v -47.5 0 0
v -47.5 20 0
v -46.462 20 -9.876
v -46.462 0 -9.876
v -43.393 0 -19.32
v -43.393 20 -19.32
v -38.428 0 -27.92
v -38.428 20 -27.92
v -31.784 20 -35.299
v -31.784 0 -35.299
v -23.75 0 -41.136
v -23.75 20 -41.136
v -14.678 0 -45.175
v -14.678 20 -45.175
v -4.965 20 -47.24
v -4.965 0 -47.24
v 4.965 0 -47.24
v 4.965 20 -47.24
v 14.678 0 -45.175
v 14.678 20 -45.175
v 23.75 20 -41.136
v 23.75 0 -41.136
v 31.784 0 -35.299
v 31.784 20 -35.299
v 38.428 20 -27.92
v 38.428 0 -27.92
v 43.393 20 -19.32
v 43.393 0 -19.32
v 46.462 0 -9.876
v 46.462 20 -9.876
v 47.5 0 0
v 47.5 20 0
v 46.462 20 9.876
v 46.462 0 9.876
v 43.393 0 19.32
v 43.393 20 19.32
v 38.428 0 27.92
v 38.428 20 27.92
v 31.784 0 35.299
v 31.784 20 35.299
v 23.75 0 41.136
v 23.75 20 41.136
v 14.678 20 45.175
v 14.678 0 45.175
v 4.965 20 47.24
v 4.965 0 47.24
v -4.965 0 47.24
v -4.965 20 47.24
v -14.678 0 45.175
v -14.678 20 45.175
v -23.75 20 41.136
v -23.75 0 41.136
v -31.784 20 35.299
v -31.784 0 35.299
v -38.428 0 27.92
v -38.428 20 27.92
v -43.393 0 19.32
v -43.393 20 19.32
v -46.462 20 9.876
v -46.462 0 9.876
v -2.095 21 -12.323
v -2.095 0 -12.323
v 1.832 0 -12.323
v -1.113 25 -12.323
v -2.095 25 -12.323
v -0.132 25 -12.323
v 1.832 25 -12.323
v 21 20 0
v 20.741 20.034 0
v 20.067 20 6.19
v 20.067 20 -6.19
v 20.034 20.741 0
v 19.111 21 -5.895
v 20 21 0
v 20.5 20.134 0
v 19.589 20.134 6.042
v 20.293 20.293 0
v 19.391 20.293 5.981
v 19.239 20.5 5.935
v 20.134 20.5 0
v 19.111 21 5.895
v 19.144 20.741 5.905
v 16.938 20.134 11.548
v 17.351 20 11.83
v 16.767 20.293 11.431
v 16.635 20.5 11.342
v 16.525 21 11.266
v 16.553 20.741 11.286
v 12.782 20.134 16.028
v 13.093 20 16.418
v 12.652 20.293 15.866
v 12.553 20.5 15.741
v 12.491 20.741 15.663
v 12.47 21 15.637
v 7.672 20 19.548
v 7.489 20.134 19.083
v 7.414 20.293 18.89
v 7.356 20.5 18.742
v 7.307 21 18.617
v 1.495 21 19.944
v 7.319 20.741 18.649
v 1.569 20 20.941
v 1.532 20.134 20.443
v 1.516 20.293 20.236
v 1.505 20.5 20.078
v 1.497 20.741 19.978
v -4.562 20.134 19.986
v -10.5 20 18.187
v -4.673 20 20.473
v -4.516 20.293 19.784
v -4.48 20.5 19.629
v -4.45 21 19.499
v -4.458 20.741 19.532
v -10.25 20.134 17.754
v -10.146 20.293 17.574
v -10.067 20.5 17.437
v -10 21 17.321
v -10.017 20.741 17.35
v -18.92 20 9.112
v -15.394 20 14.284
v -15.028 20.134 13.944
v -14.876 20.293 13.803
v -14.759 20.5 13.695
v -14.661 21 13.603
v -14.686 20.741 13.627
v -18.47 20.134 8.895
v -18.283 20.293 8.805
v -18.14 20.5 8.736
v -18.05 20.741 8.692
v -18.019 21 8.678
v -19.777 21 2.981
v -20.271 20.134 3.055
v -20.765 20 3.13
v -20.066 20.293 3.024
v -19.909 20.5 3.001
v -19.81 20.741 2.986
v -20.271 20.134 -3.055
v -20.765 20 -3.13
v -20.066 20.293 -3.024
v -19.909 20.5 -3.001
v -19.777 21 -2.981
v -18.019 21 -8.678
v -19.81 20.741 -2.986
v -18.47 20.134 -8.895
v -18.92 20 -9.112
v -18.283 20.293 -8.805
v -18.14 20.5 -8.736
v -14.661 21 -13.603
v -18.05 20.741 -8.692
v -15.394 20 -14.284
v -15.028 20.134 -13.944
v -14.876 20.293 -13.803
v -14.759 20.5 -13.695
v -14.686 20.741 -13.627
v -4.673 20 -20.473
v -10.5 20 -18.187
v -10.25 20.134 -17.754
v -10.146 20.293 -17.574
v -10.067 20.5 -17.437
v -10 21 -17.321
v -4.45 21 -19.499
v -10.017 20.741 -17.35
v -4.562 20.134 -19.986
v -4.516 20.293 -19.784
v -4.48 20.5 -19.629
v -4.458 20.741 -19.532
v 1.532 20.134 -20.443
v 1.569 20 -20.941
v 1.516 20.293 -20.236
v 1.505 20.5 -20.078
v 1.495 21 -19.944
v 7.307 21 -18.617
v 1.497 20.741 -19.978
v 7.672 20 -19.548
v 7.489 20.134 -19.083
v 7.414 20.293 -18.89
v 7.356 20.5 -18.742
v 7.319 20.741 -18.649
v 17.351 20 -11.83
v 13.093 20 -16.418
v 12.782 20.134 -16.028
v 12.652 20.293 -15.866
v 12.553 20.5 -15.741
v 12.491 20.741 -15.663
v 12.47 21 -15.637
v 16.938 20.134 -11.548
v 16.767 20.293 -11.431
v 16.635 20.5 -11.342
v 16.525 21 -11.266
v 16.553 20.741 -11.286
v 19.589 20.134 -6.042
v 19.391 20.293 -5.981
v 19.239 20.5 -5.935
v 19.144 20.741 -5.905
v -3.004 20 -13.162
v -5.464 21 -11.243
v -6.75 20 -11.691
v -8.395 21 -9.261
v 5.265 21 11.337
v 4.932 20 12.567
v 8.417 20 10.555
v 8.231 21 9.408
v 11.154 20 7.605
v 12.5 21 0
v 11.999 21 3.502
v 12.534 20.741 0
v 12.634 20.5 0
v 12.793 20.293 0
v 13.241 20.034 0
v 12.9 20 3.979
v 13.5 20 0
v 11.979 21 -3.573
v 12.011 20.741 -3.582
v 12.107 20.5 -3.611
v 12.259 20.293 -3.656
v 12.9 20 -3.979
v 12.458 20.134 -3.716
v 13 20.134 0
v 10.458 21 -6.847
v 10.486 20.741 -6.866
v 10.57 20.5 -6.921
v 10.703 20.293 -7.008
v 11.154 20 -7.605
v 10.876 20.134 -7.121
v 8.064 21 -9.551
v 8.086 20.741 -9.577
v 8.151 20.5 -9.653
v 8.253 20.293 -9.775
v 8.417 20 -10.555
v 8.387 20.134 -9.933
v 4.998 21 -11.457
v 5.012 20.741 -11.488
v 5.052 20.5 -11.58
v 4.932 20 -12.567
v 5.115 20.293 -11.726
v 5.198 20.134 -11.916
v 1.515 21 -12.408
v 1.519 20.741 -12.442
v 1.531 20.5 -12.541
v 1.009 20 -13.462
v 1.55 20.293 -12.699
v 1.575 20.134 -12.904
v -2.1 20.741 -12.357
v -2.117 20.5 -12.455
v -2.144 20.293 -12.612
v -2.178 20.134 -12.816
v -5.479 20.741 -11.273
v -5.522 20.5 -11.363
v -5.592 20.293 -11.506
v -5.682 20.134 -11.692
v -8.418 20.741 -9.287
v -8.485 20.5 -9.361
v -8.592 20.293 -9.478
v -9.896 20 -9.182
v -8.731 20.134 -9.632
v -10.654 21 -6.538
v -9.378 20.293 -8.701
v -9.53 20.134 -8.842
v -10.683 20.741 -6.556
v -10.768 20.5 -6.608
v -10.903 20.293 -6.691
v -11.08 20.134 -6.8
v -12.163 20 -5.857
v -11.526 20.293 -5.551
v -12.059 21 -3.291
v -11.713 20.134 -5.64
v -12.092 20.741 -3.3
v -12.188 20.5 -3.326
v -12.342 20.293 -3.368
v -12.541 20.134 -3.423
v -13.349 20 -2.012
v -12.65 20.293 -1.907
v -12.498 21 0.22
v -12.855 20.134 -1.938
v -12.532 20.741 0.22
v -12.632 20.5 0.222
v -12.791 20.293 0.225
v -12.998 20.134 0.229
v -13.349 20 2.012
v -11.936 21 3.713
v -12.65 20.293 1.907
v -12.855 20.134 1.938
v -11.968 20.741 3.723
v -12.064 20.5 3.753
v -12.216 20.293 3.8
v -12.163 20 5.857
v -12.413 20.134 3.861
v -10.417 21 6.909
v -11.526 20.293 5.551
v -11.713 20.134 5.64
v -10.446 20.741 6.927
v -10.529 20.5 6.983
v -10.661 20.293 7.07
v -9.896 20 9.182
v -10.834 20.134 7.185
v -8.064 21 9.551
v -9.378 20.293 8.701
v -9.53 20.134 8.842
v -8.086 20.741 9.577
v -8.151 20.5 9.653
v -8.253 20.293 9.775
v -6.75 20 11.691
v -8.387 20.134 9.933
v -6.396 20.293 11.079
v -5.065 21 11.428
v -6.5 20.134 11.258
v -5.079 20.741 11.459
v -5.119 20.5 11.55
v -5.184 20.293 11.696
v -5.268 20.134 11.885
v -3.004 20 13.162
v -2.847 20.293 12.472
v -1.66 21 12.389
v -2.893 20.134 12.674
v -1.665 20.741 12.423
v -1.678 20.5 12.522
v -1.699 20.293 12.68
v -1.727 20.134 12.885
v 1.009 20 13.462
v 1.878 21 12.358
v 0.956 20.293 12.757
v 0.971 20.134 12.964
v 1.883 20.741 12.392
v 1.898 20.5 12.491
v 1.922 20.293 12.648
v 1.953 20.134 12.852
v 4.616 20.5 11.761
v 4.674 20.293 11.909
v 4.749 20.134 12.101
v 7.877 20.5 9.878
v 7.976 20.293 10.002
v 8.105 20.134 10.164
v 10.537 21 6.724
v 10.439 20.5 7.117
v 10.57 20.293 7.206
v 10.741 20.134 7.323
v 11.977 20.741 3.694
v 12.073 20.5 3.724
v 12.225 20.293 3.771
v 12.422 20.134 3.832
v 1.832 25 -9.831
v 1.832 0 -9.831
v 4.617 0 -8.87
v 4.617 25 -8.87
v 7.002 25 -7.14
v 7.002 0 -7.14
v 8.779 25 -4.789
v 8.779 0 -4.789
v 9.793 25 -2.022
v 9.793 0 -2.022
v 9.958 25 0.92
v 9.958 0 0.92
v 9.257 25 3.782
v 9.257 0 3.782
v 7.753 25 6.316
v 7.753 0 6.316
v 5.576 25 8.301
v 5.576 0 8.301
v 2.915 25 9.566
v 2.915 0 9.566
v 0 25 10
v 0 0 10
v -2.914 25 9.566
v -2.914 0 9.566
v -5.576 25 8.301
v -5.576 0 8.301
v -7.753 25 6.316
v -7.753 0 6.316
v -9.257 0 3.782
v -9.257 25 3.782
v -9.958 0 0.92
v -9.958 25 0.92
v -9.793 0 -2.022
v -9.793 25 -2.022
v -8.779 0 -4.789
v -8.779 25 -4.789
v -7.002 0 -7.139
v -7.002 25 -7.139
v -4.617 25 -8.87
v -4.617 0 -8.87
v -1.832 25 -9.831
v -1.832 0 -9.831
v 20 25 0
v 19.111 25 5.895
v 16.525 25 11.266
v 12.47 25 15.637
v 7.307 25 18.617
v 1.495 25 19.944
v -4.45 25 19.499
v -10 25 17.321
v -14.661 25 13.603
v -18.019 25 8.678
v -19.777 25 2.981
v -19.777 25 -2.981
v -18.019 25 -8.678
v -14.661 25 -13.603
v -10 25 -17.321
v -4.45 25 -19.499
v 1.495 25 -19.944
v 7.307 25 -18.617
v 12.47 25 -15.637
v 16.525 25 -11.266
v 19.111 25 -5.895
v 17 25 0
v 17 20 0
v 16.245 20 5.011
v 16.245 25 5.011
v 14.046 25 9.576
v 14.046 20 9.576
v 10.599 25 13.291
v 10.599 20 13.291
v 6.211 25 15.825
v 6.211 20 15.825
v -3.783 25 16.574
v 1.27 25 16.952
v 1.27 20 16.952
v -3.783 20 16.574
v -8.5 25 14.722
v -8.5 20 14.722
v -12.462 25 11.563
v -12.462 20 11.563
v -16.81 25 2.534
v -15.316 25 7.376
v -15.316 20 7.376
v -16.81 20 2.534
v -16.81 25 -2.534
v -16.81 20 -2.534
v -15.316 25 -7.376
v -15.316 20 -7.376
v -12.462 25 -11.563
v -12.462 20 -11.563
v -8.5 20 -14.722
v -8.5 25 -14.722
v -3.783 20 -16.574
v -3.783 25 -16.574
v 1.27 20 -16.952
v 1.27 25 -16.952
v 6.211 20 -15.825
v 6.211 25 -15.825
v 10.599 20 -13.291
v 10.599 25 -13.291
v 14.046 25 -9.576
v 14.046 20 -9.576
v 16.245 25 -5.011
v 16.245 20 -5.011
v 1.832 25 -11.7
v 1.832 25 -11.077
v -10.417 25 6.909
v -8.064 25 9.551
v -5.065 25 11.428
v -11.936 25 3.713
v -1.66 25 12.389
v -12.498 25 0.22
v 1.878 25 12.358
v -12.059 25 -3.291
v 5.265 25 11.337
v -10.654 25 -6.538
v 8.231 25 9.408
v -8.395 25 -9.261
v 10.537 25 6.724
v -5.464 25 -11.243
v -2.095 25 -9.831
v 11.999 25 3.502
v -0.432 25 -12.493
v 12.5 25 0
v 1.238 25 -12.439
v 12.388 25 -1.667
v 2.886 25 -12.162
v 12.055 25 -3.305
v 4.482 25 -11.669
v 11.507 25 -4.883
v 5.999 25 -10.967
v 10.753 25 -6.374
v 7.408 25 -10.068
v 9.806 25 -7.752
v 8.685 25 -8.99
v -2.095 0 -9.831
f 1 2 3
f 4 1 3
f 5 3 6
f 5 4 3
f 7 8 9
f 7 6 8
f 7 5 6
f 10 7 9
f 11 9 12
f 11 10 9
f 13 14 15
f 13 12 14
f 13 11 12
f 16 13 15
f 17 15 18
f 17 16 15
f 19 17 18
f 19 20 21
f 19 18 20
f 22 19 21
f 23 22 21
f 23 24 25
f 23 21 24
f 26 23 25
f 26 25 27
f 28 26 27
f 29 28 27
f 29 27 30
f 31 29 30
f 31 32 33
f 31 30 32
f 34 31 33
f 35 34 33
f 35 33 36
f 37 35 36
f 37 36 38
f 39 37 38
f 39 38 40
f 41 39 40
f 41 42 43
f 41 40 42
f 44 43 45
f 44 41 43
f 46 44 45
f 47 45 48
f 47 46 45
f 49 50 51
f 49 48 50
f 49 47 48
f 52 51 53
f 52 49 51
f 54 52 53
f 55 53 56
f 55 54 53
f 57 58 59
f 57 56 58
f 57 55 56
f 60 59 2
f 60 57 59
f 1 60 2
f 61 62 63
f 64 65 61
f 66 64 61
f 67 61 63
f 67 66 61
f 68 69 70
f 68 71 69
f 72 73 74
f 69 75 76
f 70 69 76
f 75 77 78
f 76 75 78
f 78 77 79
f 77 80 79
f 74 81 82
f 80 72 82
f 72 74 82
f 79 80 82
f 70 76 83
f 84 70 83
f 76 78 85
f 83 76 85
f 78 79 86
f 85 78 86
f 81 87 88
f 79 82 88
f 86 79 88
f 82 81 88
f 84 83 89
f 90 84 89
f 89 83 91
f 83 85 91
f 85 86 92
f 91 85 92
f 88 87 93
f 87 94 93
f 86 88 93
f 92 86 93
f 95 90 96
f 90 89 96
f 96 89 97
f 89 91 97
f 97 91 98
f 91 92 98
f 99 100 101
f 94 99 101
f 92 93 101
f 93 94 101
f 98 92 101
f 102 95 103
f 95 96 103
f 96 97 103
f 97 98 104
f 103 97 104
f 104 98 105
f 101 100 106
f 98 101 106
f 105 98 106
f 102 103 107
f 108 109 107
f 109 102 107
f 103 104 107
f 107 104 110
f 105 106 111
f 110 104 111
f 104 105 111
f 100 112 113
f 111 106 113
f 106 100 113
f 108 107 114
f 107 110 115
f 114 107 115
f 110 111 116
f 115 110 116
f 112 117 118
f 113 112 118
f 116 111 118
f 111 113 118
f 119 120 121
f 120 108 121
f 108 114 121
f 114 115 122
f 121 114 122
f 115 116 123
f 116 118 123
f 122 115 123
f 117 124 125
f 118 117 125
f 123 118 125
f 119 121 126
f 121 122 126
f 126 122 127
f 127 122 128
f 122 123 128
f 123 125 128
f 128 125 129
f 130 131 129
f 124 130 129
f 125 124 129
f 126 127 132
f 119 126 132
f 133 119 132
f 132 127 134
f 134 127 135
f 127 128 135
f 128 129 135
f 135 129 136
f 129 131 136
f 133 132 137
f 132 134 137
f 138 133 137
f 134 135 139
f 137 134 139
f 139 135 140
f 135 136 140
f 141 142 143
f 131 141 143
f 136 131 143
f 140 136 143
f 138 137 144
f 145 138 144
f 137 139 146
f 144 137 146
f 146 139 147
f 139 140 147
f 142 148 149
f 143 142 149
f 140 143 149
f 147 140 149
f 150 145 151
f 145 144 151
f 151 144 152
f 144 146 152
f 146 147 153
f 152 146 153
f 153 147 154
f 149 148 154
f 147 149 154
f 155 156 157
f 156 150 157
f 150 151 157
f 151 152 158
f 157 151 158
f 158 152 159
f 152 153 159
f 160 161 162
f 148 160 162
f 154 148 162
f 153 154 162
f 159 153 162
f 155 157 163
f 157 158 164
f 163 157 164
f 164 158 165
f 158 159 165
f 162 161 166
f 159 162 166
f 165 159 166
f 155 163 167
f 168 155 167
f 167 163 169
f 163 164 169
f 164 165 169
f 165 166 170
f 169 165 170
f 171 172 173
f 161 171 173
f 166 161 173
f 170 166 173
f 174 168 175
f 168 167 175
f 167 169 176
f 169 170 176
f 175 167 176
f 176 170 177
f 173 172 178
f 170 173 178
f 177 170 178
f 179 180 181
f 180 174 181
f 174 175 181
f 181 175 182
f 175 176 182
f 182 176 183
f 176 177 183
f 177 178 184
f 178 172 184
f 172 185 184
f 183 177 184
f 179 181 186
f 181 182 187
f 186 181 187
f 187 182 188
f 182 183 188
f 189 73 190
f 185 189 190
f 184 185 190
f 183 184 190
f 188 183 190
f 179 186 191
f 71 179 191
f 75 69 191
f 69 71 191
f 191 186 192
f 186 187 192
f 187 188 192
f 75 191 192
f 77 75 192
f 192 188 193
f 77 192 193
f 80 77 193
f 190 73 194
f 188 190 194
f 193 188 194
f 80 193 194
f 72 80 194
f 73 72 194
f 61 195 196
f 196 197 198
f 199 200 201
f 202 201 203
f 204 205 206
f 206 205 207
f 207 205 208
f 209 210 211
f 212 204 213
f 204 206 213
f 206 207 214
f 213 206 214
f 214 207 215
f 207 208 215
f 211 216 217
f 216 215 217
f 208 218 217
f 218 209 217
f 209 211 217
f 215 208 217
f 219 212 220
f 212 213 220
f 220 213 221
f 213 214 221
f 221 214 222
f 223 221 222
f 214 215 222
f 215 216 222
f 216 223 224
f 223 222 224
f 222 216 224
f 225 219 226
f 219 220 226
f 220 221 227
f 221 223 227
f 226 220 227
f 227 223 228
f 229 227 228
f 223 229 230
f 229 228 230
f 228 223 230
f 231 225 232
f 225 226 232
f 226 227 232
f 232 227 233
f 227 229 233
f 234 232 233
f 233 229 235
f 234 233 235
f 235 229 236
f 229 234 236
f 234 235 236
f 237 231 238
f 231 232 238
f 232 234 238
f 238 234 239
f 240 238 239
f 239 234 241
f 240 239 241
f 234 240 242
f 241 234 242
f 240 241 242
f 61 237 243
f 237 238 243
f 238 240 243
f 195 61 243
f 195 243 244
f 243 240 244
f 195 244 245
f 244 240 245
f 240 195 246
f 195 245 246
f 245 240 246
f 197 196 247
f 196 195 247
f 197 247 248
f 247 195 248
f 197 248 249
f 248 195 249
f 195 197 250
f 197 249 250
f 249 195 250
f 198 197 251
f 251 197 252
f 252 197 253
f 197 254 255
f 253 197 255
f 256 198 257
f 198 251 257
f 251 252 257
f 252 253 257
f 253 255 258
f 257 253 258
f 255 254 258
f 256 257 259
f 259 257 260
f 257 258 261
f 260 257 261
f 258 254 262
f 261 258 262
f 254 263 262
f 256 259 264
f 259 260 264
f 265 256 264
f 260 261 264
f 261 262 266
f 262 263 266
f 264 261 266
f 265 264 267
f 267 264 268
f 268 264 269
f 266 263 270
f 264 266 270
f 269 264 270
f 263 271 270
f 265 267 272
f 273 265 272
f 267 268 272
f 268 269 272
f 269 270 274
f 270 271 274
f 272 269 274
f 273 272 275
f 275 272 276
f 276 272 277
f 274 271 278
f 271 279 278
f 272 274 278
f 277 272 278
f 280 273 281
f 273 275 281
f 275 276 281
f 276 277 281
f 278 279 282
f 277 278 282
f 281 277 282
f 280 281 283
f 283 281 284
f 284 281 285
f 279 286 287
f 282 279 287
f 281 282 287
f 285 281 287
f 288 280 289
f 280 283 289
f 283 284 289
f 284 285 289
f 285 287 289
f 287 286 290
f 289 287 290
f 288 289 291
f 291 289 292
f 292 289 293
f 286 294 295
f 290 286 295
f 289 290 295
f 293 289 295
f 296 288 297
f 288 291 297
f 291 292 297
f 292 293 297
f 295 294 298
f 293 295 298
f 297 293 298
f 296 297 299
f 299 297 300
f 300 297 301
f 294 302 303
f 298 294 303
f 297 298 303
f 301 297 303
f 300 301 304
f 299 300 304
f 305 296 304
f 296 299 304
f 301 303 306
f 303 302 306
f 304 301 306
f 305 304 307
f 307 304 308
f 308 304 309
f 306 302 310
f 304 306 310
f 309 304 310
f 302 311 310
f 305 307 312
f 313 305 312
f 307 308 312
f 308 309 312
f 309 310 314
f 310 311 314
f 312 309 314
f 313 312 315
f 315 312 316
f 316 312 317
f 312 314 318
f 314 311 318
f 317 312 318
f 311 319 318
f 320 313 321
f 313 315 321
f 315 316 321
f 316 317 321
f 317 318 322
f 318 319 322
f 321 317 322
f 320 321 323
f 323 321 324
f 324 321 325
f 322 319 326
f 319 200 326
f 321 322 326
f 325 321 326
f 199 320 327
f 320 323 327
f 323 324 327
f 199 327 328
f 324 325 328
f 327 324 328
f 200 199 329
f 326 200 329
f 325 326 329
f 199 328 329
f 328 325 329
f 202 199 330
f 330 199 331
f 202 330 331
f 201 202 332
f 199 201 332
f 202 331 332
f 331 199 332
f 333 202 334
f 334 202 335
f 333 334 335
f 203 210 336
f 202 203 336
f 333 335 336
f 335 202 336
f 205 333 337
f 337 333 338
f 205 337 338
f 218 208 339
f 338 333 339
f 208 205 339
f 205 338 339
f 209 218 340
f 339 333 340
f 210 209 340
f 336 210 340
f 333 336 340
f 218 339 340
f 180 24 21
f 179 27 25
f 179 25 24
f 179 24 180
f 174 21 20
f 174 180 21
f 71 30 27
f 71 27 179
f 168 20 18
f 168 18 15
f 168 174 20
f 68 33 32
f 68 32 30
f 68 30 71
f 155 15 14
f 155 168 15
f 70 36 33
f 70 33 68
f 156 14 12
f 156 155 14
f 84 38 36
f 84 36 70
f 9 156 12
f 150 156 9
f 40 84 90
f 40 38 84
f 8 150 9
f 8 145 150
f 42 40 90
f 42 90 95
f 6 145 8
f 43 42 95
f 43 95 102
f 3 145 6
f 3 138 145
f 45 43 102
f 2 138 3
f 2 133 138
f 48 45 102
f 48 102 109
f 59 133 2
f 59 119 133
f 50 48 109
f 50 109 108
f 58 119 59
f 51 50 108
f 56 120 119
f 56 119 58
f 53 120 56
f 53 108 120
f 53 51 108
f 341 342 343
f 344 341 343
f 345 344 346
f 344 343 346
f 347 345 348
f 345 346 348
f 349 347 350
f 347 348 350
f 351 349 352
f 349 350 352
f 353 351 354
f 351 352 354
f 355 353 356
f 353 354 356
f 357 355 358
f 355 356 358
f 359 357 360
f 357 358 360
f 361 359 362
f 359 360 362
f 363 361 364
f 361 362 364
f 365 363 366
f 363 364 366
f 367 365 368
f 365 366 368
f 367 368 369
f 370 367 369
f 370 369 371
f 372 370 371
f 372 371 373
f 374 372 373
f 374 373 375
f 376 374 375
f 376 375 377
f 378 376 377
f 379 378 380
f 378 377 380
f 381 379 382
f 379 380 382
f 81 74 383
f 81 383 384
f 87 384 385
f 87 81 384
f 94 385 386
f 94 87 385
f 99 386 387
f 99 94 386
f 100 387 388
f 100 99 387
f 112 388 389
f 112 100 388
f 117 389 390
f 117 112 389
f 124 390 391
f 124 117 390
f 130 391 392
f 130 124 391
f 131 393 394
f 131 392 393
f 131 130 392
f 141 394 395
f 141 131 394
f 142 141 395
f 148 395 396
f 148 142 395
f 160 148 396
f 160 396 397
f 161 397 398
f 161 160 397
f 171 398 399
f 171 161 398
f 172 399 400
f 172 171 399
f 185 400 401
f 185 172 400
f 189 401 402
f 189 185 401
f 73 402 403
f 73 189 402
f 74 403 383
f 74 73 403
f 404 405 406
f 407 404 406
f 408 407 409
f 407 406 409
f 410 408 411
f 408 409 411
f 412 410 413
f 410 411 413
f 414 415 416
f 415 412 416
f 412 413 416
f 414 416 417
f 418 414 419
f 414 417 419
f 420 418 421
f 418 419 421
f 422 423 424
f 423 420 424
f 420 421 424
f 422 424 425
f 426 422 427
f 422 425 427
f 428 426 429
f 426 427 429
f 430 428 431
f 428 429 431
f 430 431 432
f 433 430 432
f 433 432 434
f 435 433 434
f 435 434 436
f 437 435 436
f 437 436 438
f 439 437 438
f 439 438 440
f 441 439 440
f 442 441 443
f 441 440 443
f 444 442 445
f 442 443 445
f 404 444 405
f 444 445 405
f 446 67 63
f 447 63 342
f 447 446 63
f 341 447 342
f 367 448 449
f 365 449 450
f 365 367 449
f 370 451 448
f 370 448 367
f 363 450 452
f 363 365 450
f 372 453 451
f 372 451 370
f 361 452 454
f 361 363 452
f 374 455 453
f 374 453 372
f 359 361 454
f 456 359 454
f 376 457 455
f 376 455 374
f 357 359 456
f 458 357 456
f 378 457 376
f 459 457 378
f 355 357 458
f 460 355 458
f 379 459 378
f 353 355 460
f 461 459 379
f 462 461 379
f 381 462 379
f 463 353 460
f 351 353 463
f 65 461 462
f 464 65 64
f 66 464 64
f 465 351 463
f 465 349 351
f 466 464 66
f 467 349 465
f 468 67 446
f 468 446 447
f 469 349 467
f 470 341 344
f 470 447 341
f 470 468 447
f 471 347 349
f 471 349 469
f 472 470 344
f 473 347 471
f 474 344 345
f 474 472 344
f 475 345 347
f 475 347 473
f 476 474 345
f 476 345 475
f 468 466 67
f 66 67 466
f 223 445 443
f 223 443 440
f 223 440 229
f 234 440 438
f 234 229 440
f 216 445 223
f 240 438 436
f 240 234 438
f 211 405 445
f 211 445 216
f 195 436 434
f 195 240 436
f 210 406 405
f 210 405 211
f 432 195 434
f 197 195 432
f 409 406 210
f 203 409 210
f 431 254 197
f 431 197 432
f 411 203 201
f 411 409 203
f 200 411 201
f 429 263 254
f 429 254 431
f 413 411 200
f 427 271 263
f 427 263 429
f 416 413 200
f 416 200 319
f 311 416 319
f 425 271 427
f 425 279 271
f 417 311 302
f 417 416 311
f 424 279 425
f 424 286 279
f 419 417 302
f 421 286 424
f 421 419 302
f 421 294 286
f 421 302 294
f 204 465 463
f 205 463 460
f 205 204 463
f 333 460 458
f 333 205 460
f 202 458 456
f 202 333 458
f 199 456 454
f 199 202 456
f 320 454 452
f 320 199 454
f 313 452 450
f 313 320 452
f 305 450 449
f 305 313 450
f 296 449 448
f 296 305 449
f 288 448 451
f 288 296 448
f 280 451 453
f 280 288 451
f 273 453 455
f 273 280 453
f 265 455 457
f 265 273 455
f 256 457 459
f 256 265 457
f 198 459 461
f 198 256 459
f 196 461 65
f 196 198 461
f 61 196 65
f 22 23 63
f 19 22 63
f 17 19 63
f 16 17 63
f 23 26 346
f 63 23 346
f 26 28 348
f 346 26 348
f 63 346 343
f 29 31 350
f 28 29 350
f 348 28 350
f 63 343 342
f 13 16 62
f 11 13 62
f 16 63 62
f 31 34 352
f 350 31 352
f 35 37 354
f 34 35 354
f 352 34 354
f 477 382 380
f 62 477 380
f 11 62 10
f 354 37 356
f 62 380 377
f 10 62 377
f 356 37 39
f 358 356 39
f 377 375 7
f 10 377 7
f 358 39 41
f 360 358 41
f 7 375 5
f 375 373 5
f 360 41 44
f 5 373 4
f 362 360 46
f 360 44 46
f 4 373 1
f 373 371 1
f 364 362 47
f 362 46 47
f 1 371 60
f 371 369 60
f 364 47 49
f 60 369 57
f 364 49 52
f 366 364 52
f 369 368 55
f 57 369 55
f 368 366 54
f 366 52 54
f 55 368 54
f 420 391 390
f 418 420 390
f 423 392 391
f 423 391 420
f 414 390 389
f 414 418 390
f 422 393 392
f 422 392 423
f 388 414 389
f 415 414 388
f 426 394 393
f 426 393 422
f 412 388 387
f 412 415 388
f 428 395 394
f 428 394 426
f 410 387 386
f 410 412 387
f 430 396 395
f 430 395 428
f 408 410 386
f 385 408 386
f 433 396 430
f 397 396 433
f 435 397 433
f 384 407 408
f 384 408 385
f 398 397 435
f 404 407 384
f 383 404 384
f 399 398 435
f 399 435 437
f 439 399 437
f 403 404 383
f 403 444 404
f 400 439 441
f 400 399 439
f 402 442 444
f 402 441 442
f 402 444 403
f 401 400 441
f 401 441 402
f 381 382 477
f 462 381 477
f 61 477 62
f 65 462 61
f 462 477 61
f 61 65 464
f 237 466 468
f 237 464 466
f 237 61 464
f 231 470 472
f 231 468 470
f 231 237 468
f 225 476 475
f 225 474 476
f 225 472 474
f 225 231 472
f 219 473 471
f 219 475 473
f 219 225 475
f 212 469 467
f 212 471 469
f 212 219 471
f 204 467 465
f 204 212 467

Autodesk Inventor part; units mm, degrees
ref_plane "YZ Plane" through (0, 0, 0) normal (1, 0, 0) x (0, 1, 0)
ref_plane "XZ Plane" through (0, 0, 0) normal (0, 1, 0) x (-1, 0, 0)
ref_plane "XY Plane" through (0, 0, 0) normal (0, 0, 1) x (1, 0, 0)
sketch "Boceto1" plane through (0, 0, 0) normal (0, 1, 0) x (-1, 0, 0)
  circle A0 centre (0, 0) radius 47.5
  circle A1 centre (0, 0) radius 10
  dimension "d0" = 95
  dimension "d1" = 20
extrude "Extrusión1" add sketch "Boceto1" along normal blind 20
sketch "Boceto3" plane through (0, 20, 0) normal (0, 1, 0) x (1, 0, 0)
  circle A0 centre (0, 0) radius 10
  circle A1 centre (0, 0) radius 12.5
  circle A2 centre (0, 0) radius 17
  circle A3 centre (0, 0) radius 20
  dimension "d18" = 20
  dimension "d19" = 25
  dimension "d20" = 34
  dimension "d21" = 40
extrude "Extrusión3" add sketch "Boceto3" along normal blind 5 contours A1
extrude "Extrusión4" add sketch "Boceto3" along normal blind 5 contours A3
fillet "Empalme1" radius 1 2 edges at (-20, 20, 0) (-12.5, 20, 0)
sketch "Boceto4" plane through (0, 25, 0) normal (0, 1, 0) x (1, 0, 0)
  circle A0 centre (0, 0) radius 12.5 projected
  circle A1 centre (0, 0) radius 10 projected
  line L0 (-2.0947, 12.3232) -> (1.8315, 12.3232)
  line L1 (1.8315, 12.3232) -> (1.8315, 9.8308)
  line L2 (1.8315, 9.8308) -> (-2.0947, 9.8308)
  line L3 (-2.0947, 9.8308) -> (-2.0947, 12.3232)
  point P0 (-1.8315, 9.8308)
extrude "Extrusión5" cut sketch "Boceto4" against normal through all contours L0 L1 A1 L2 L3
ref_plane "Plano de trabajo1" through (0, 20, 0) normal (0, 1, 0) x (1, 0, 0)
sketch "Boceto5" plane through (0, 20, 0) normal (0, 1, 0) x (1, 0, 0)
  arc A0 (-5.7983, 45.129) -> (-6.6944, 47.0259) centre (-9.668, 44.461) ccw
  arc A1 (-9.4598, 46.5485) -> (-9.596, 44.1298) centre (-5.7983, 45.129) ccw
  arc A2 (-5.7983, 45.129) -> (-3.5136, 41.8874) centre (-1.8853, 45.4609) ccw
  arc A3 (-10.7336, 40.641) -> (-9.596, 44.1298) centre (-13.4658, 43.4617) ccw
  arc A4 (-6.6944, 47.0259) -> (-9.4598, 46.5485) centre (0, 0) ccw
  circle A5 centre (0, 0) radius 42.0345
  arc A6 (-17.3991, 44.1987) -> (-17.1133, 41.793) centre (-13.5468, 43.4366) ccw
  arc A7 (-17.6278, 38.1597) -> (-17.1133, 41.793) centre (-20.8083, 40.4631) ccw
  arc A8 (-14.7587, 45.149) -> (-17.3991, 44.1987) centre (0, 0) ccw
  arc A9 (-13.5468, 43.4366) -> (-14.7587, 45.149) centre (-17.2417, 42.1067) ccw
  arc A10 (-13.5468, 43.4366) -> (-10.7339, 40.6409) centre (-9.7509, 44.4429) ccw
  circle A11 centre (0, 0) radius 42.0345
  arc A12 (-24.8098, 40.5059) -> (-24.1106, 38.1864) centre (-20.8836, 40.4243) ccw
  arc A13 (-23.9864, 34.5189) -> (-24.1106, 38.1864) centre (-27.5185, 36.2351) ccw
  arc A14 (-22.3745, 41.9003) -> (-24.8098, 40.5059) centre (0, 0) ccw
  arc A15 (-20.8836, 40.4243) -> (-22.3745, 41.9003) centre (-24.2915, 38.473) ccw
  arc A16 (-20.8836, 40.4243) -> (-17.628, 38.1596) centre (-17.3202, 42.0745) ccw
  circle A17 centre (0, 0) radius 42.0345
  arc A18 (-31.4666, 35.5823) -> (-30.3753, 33.4195) centre (-27.586, 36.1838) ccw
  arc A19 (-29.6161, 29.8293) -> (-30.3753, 33.4195) centre (-33.3926, 30.9061) ccw
  arc A20 (-29.3105, 37.3784) -> (-31.4666, 35.5823) centre (0, 0) ccw
  arc A21 (-27.586, 36.1838) -> (-29.3105, 37.3784) centre (-30.6033, 33.6703) ccw
  arc A22 (-27.586, 36.1838) -> (-23.9866, 34.5188) centre (-24.3632, 38.4277) ccw
  circle A23 centre (0, 0) radius 42.0345
  arc A24 (-37.1674, 29.5776) -> (-35.7171, 27.6372) centre (-33.4501, 30.8438) ccw
  arc A25 (-34.346, 24.2333) -> (-35.7171, 27.6372) centre (-38.2521, 24.638) ccw
  arc A26 (-35.3559, 31.7209) -> (-37.1674, 29.5776) centre (0, 0) ccw
  arc A27 (-33.4501, 30.8438) -> (-35.3559, 31.7209) centre (-35.9851, 27.8446) ccw
  arc A28 (-33.4501, 30.8438) -> (-29.6163, 29.8291) centre (-30.666, 33.6132) ccw
  circle A29 centre (0, 0) radius 42.0345
  arc A30 (-41.7388, 22.6742) -> (-39.9736, 21.0151) centre (-38.2979, 24.5666) ccw
  arc A31 (-38.0322, 17.9011) -> (-39.9736, 21.0151) centre (-41.9493, 17.6213) ccw
  arc A32 (-40.327, 25.0995) -> (-41.7388, 22.6742) centre (0, 0) ccw
  arc A33 (-38.2979, 24.5666) -> (-40.327, 25.0995) centre (-40.2736, 21.1728) ccw
  arc A34 (-38.2979, 24.5666) -> (-34.3461, 24.2331) centre (-36.037, 27.7775) ccw
  circle A35 centre (0, 0) radius 42.0345
  arc A36 (-45.0421, 15.0819) -> (-43.0155, 13.7545) centre (-41.982, 17.5431) ccw
  arc A37 (-40.5629, 11.0249) -> (-43.0155, 13.7545) centre (-44.3719, 10.0692) ccw
  arc A38 (-44.0728, 17.7154) -> (-45.0421, 15.0819) centre (0, 0) ccw
  arc A39 (-41.982, 17.5431) -> (-44.0728, 17.7154) centre (-43.3384, 13.8577) ccw
  arc A40 (-41.982, 17.5431) -> (-38.0323, 17.9008) centre (-40.313, 21.0977) ccw
  circle A41 centre (0, 0) radius 42.0345
  arc A42 (-46.9767, 7.0313) -> (-44.7505, 6.076) centre (-44.3906, 9.9864) ccw
  arc A43 (-41.8611, 3.8137) -> (-44.7505, 6.076) centre (-45.4462, 2.2111) ccw
  arc A44 (-46.4795, 9.7931) -> (-46.9767, 7.0313) centre (0, 0) ccw
  arc A45 (-44.3906, 9.9864) -> (-46.4795, 9.7931) centre (-45.0863, 6.1216) ccw
  arc A46 (-44.3906, 9.9864) -> (-40.563, 11.0246) centre (-43.3641, 13.7769) ccw
  circle A47 centre (0, 0) radius 42.0345
  arc A48 (-47.484, -1.233) -> (-45.1257, -1.7872) centre (-45.4503, 2.1264) ccw
  arc A49 (-41.8874, -3.5133) -> (-45.1257, -1.7872) centre (-45.1398, -5.7142) ccw
  arc A50 (-47.4739, 1.5733) -> (-47.484, -1.233) centre (0, 0) ccw
  arc A51 (-45.4503, 2.1264) -> (-47.4739, 1.5733) centre (-45.4644, -1.8006) ccw
  arc A52 (-45.4503, 2.1264) -> (-41.8612, 3.8135) centre (-45.0977, 6.0375) ccw
  circle A53 centre (0, 0) radius 42.0345
  arc A54 (-46.5485, -9.4598) -> (-44.1298, -9.596) centre (-45.129, -5.7983) ccw
  arc A55 (-40.641, -10.7336) -> (-44.1298, -9.596) centre (-43.4617, -13.4658) ccw
  arc A56 (-47.0259, -6.6944) -> (-46.5485, -9.4598) centre (0, 0) ccw
  arc A57 (-45.129, -5.7983) -> (-47.0259, -6.6944) centre (-44.461, -9.668) ccw
  arc A58 (-45.129, -5.7983) -> (-41.8874, -3.5136) centre (-45.4609, -1.8853) ccw
  circle A59 centre (0, 0) radius 42.0345
  arc A60 (-44.1987, -17.3991) -> (-41.793, -17.1133) centre (-43.4366, -13.5468) ccw
  arc A61 (-38.1597, -17.6278) -> (-41.793, -17.1133) centre (-40.4631, -20.8083) ccw
  arc A62 (-45.149, -14.7587) -> (-44.1987, -17.3991) centre (0, 0) ccw
  arc A63 (-43.4366, -13.5468) -> (-45.149, -14.7587) centre (-42.1067, -17.2417) ccw
  arc A64 (-43.4366, -13.5468) -> (-40.6409, -10.7339) centre (-44.4429, -9.7509) ccw
  circle A65 centre (0, 0) radius 42.0345
  arc A66 (-40.5059, -24.8098) -> (-38.1864, -24.1106) centre (-40.4243, -20.8836) ccw
  arc A67 (-34.5189, -23.9864) -> (-38.1864, -24.1106) centre (-36.2351, -27.5185) ccw
  arc A68 (-41.9003, -22.3745) -> (-40.5059, -24.8098) centre (0, 0) ccw
  arc A69 (-40.4243, -20.8836) -> (-41.9003, -22.3745) centre (-38.473, -24.2915) ccw
  arc A70 (-40.4243, -20.8836) -> (-38.1596, -17.628) centre (-42.0745, -17.3202) ccw
  circle A71 centre (0, 0) radius 42.0345
  arc A72 (-35.5823, -31.4666) -> (-33.4195, -30.3753) centre (-36.1838, -27.586) ccw
  arc A73 (-29.8293, -29.6161) -> (-33.4195, -30.3753) centre (-30.9061, -33.3926) ccw
  arc A74 (-37.3784, -29.3105) -> (-35.5823, -31.4666) centre (0, 0) ccw
  arc A75 (-36.1838, -27.586) -> (-37.3784, -29.3105) centre (-33.6703, -30.6033) ccw
  arc A76 (-36.1838, -27.586) -> (-34.5188, -23.9866) centre (-38.4277, -24.3632) ccw
  circle A77 centre (0, 0) radius 42.0345
  arc A78 (-29.5776, -37.1674) -> (-27.6372, -35.7171) centre (-30.8438, -33.4501) ccw
  arc A79 (-24.2333, -34.346) -> (-27.6372, -35.7171) centre (-24.638, -38.2521) ccw
  arc A80 (-31.7209, -35.3559) -> (-29.5776, -37.1674) centre (0, 0) ccw
  arc A81 (-30.8438, -33.4501) -> (-31.7209, -35.3559) centre (-27.8446, -35.9851) ccw
  arc A82 (-30.8438, -33.4501) -> (-29.8291, -29.6163) centre (-33.6132, -30.666) ccw
  circle A83 centre (0, 0) radius 42.0345
  arc A84 (-22.6742, -41.7388) -> (-21.0151, -39.9736) centre (-24.5666, -38.2979) ccw
  arc A85 (-17.9011, -38.0322) -> (-21.0151, -39.9736) centre (-17.6213, -41.9493) ccw
  arc A86 (-25.0995, -40.327) -> (-22.6742, -41.7388) centre (0, 0) ccw
  arc A87 (-24.5666, -38.2979) -> (-25.0995, -40.327) centre (-21.1728, -40.2736) ccw
  arc A88 (-24.5666, -38.2979) -> (-24.2331, -34.3461) centre (-27.7775, -36.037) ccw
  circle A89 centre (0, 0) radius 42.0345
  arc A90 (-15.0819, -45.0421) -> (-13.7545, -43.0155) centre (-17.5431, -41.982) ccw
  arc A91 (-11.0249, -40.5629) -> (-13.7545, -43.0155) centre (-10.0692, -44.3719) ccw
  arc A92 (-17.7154, -44.0728) -> (-15.0819, -45.0421) centre (0, 0) ccw
  arc A93 (-17.5431, -41.982) -> (-17.7154, -44.0728) centre (-13.8577, -43.3384) ccw
  arc A94 (-17.5431, -41.982) -> (-17.9008, -38.0323) centre (-21.0977, -40.313) ccw
  circle A95 centre (0, 0) radius 42.0345
  arc A96 (-7.0313, -46.9767) -> (-6.076, -44.7505) centre (-9.9864, -44.3906) ccw
  arc A97 (-3.8137, -41.8611) -> (-6.076, -44.7505) centre (-2.2111, -45.4462) ccw
  arc A98 (-9.7931, -46.4795) -> (-7.0313, -46.9767) centre (0, 0) ccw
  arc A99 (-9.9864, -44.3906) -> (-9.7931, -46.4795) centre (-6.1216, -45.0863) ccw
  arc A100 (-9.9864, -44.3906) -> (-11.0246, -40.563) centre (-13.7769, -43.3641) ccw
  circle A101 centre (0, 0) radius 42.0345
  arc A102 (1.233, -47.484) -> (1.7872, -45.1257) centre (-2.1264, -45.4503) ccw
  arc A103 (3.5133, -41.8874) -> (1.7872, -45.1257) centre (5.7142, -45.1398) ccw
  arc A104 (-1.5733, -47.4739) -> (1.233, -47.484) centre (0, 0) ccw
  arc A105 (-2.1264, -45.4503) -> (-1.5733, -47.4739) centre (1.8006, -45.4644) ccw
  arc A106 (-2.1264, -45.4503) -> (-3.8135, -41.8612) centre (-6.0375, -45.0977) ccw
  circle A107 centre (0, 0) radius 42.0345
  arc A108 (9.4598, -46.5485) -> (9.596, -44.1298) centre (5.7983, -45.129) ccw
  arc A109 (10.7336, -40.641) -> (9.596, -44.1298) centre (13.4658, -43.4617) ccw
  arc A110 (6.6944, -47.0259) -> (9.4598, -46.5485) centre (0, 0) ccw
  arc A111 (5.7983, -45.129) -> (6.6944, -47.0259) centre (9.668, -44.461) ccw
  arc A112 (5.7983, -45.129) -> (3.5136, -41.8874) centre (1.8853, -45.4609) ccw
  circle A113 centre (0, 0) radius 42.0345
  arc A114 (17.3991, -44.1987) -> (17.1133, -41.793) centre (13.5468, -43.4366) ccw
  arc A115 (17.6278, -38.1597) -> (17.1133, -41.793) centre (20.8083, -40.4631) ccw
  arc A116 (14.7587, -45.149) -> (17.3991, -44.1987) centre (0, 0) ccw
  arc A117 (13.5468, -43.4366) -> (14.7587, -45.149) centre (17.2417, -42.1067) ccw
  arc A118 (13.5468, -43.4366) -> (10.7339, -40.6409) centre (9.7509, -44.4429) ccw
  circle A119 centre (0, 0) radius 42.0345
  arc A120 (24.8098, -40.5059) -> (24.1106, -38.1864) centre (20.8836, -40.4243) ccw
  arc A121 (23.9864, -34.5189) -> (24.1106, -38.1864) centre (27.5185, -36.2351) ccw
  arc A122 (22.3745, -41.9003) -> (24.8098, -40.5059) centre (0, 0) ccw
  arc A123 (20.8836, -40.4243) -> (22.3745, -41.9003) centre (24.2915, -38.473) ccw
  arc A124 (20.8836, -40.4243) -> (17.628, -38.1596) centre (17.3202, -42.0745) ccw
  circle A125 centre (0, 0) radius 42.0345
  arc A126 (31.4666, -35.5823) -> (30.3753, -33.4195) centre (27.586, -36.1838) ccw
  arc A127 (29.6161, -29.8293) -> (30.3753, -33.4195) centre (33.3926, -30.9061) ccw
  arc A128 (29.3105, -37.3784) -> (31.4666, -35.5823) centre (0, 0) ccw
  arc A129 (27.586, -36.1838) -> (29.3105, -37.3784) centre (30.6033, -33.6703) ccw
  arc A130 (27.586, -36.1838) -> (23.9866, -34.5188) centre (24.3632, -38.4277) ccw
  circle A131 centre (0, 0) radius 42.0345
  arc A132 (37.1674, -29.5776) -> (35.7171, -27.6372) centre (33.4501, -30.8438) ccw
  arc A133 (34.346, -24.2333) -> (35.7171, -27.6372) centre (38.2521, -24.638) ccw
  arc A134 (35.3559, -31.7209) -> (37.1674, -29.5776) centre (0, 0) ccw
  arc A135 (33.4501, -30.8438) -> (35.3559, -31.7209) centre (35.9851, -27.8446) ccw
  arc A136 (33.4501, -30.8438) -> (29.6163, -29.8291) centre (30.666, -33.6132) ccw
  circle A137 centre (0, 0) radius 42.0345
  arc A138 (41.7388, -22.6742) -> (39.9736, -21.0151) centre (38.2979, -24.5666) ccw
  arc A139 (38.0322, -17.9011) -> (39.9736, -21.0151) centre (41.9493, -17.6213) ccw
  arc A140 (40.327, -25.0995) -> (41.7388, -22.6742) centre (0, 0) ccw
  arc A141 (38.2979, -24.5666) -> (40.327, -25.0995) centre (40.2736, -21.1728) ccw
  arc A142 (38.2979, -24.5666) -> (34.3461, -24.2331) centre (36.037, -27.7775) ccw
  circle A143 centre (0, 0) radius 42.0345
  arc A144 (45.0421, -15.0819) -> (43.0155, -13.7545) centre (41.982, -17.5431) ccw
  arc A145 (40.5629, -11.0249) -> (43.0155, -13.7545) centre (44.3719, -10.0692) ccw
  arc A146 (44.0728, -17.7154) -> (45.0421, -15.0819) centre (0, 0) ccw
  arc A147 (41.982, -17.5431) -> (44.0728, -17.7154) centre (43.3384, -13.8577) ccw
  arc A148 (41.982, -17.5431) -> (38.0323, -17.9008) centre (40.313, -21.0977) ccw
  circle A149 centre (0, 0) radius 42.0345
  arc A150 (46.9767, -7.0313) -> (44.7505, -6.076) centre (44.3906, -9.9864) ccw
  arc A151 (41.8611, -3.8137) -> (44.7505, -6.076) centre (45.4462, -2.2111) ccw
  arc A152 (46.4795, -9.7931) -> (46.9767, -7.0313) centre (0, 0) ccw
  arc A153 (44.3906, -9.9864) -> (46.4795, -9.7931) centre (45.0863, -6.1216) ccw
  arc A154 (44.3906, -9.9864) -> (40.563, -11.0246) centre (43.3641, -13.7769) ccw
  circle A155 centre (0, 0) radius 42.0345
  arc A156 (47.484, 1.233) -> (45.1257, 1.7872) centre (45.4503, -2.1264) ccw
  arc A157 (41.8874, 3.5133) -> (45.1257, 1.7872) centre (45.1398, 5.7142) ccw
  arc A158 (47.4739, -1.5733) -> (47.484, 1.233) centre (0, 0) ccw
  arc A159 (45.4503, -2.1264) -> (47.4739, -1.5733) centre (45.4644, 1.8006) ccw
  arc A160 (45.4503, -2.1264) -> (41.8612, -3.8135) centre (45.0977, -6.0375) ccw
  circle A161 centre (0, 0) radius 42.0345
  arc A162 (46.5485, 9.4598) -> (44.1298, 9.596) centre (45.129, 5.7983) ccw
  arc A163 (40.641, 10.7336) -> (44.1298, 9.596) centre (43.4617, 13.4658) ccw
  arc A164 (47.0259, 6.6944) -> (46.5485, 9.4598) centre (0, 0) ccw
  arc A165 (45.129, 5.7983) -> (47.0259, 6.6944) centre (44.461, 9.668) ccw
  arc A166 (45.129, 5.7983) -> (41.8874, 3.5136) centre (45.4609, 1.8853) ccw
  circle A167 centre (0, 0) radius 42.0345
  arc A168 (44.1987, 17.3991) -> (41.793, 17.1133) centre (43.4366, 13.5468) ccw
  arc A169 (38.1597, 17.6278) -> (41.793, 17.1133) centre (40.4631, 20.8083) ccw
  arc A170 (45.149, 14.7587) -> (44.1987, 17.3991) centre (0, 0) ccw
  arc A171 (43.4366, 13.5468) -> (45.149, 14.7587) centre (42.1067, 17.2417) ccw
  arc A172 (43.4366, 13.5468) -> (40.6409, 10.7339) centre (44.4429, 9.7509) ccw
  circle A173 centre (0, 0) radius 42.0345
  arc A174 (40.5059, 24.8098) -> (38.1864, 24.1106) centre (40.4243, 20.8836) ccw
  arc A175 (34.5189, 23.9864) -> (38.1864, 24.1106) centre (36.2351, 27.5185) ccw
  arc A176 (41.9003, 22.3745) -> (40.5059, 24.8098) centre (0, 0) ccw
  arc A177 (40.4243, 20.8836) -> (41.9003, 22.3745) centre (38.473, 24.2915) ccw
  arc A178 (40.4243, 20.8836) -> (38.1596, 17.628) centre (42.0745, 17.3202) ccw
  circle A179 centre (0, 0) radius 42.0345
  arc A180 (35.5823, 31.4666) -> (33.4195, 30.3753) centre (36.1838, 27.586) ccw
  arc A181 (29.8293, 29.6161) -> (33.4195, 30.3753) centre (30.9061, 33.3926) ccw
  arc A182 (37.3784, 29.3105) -> (35.5823, 31.4666) centre (0, 0) ccw
  arc A183 (36.1838, 27.586) -> (37.3784, 29.3105) centre (33.6703, 30.6033) ccw
  arc A184 (36.1838, 27.586) -> (34.5188, 23.9866) centre (38.4277, 24.3632) ccw
  circle A185 centre (0, 0) radius 42.0345
  arc A186 (29.5776, 37.1674) -> (27.6372, 35.7171) centre (30.8438, 33.4501) ccw
  arc A187 (24.2333, 34.346) -> (27.6372, 35.7171) centre (24.638, 38.2521) ccw
  arc A188 (31.7209, 35.3559) -> (29.5776, 37.1674) centre (0, 0) ccw
  arc A189 (30.8438, 33.4501) -> (31.7209, 35.3559) centre (27.8446, 35.9851) ccw
  arc A190 (30.8438, 33.4501) -> (29.8291, 29.6163) centre (33.6132, 30.666) ccw
  circle A191 centre (0, 0) radius 42.0345
  arc A192 (22.6742, 41.7388) -> (21.0151, 39.9736) centre (24.5666, 38.2979) ccw
  arc A193 (17.9011, 38.0322) -> (21.0151, 39.9736) centre (17.6213, 41.9493) ccw
  arc A194 (25.0995, 40.327) -> (22.6742, 41.7388) centre (0, 0) ccw
  arc A195 (24.5666, 38.2979) -> (25.0995, 40.327) centre (21.1728, 40.2736) ccw
  arc A196 (24.5666, 38.2979) -> (24.2331, 34.3461) centre (27.7775, 36.037) ccw
  circle A197 centre (0, 0) radius 42.0345
  arc A198 (15.0819, 45.0421) -> (13.7545, 43.0155) centre (17.5431, 41.982) ccw
  arc A199 (11.0249, 40.5629) -> (13.7545, 43.0155) centre (10.0692, 44.3719) ccw
  arc A200 (17.7154, 44.0728) -> (15.0819, 45.0421) centre (0, 0) ccw
  arc A201 (17.5431, 41.982) -> (17.7154, 44.0728) centre (13.8577, 43.3384) ccw
  arc A202 (17.5431, 41.982) -> (17.9008, 38.0323) centre (21.0977, 40.313) ccw
  circle A203 centre (0, 0) radius 42.0345
  arc A204 (7.0313, 46.9767) -> (6.076, 44.7505) centre (9.9864, 44.3906) ccw
  arc A205 (3.8137, 41.8611) -> (6.076, 44.7505) centre (2.2111, 45.4462) ccw
  arc A206 (9.7931, 46.4795) -> (7.0313, 46.9767) centre (0, 0) ccw
  arc A207 (9.9864, 44.3906) -> (9.7931, 46.4795) centre (6.1216, 45.0863) ccw
  arc A208 (9.9864, 44.3906) -> (11.0246, 40.563) centre (13.7769, 43.3641) ccw
  circle A209 centre (0, 0) radius 42.0345
  arc A210 (-1.233, 47.484) -> (-1.7872, 45.1257) centre (2.1264, 45.4503) ccw
  arc A211 (-3.5133, 41.8874) -> (-1.7872, 45.1257) centre (-5.7142, 45.1398) ccw
  arc A212 (1.5733, 47.4739) -> (-1.233, 47.484) centre (0, 0) ccw
  arc A213 (2.1264, 45.4503) -> (1.5733, 47.4739) centre (-1.8006, 45.4644) ccw
  arc A214 (2.1264, 45.4503) -> (3.8135, 41.8612) centre (6.0375, 45.0977) ccw
  circle A215 centre (0, 0) radius 42.0345
  point P0 (-9.7125, 44.6168)
  dimension "d47" = 84.069
  dimension "d50" = 360
equation "\"Radio_pliegue\" = Grosor"
equation "\"Anchura_desahogo_plegado\" = Grosor"
equation "\"Profundidad_desahogo_plegado\" = 0.5 * Grosor"
equation "\"Tamaño_destalonado\" = 4 * Grosor"
equation "\"Remanente_mínimo\" = 2 * Grosor"
equation "\"Radiodetransición\" = Radio_pliegue"
equation "\"Tamaño_de_radio_de_Jacobi\" = Radio_pliegue"
equation "\"TamañoSeparación\" = Grosor"
equation "\"Grosor\" = 0.5"
properties part number "Practica 18" material "Acero inoxidable"
